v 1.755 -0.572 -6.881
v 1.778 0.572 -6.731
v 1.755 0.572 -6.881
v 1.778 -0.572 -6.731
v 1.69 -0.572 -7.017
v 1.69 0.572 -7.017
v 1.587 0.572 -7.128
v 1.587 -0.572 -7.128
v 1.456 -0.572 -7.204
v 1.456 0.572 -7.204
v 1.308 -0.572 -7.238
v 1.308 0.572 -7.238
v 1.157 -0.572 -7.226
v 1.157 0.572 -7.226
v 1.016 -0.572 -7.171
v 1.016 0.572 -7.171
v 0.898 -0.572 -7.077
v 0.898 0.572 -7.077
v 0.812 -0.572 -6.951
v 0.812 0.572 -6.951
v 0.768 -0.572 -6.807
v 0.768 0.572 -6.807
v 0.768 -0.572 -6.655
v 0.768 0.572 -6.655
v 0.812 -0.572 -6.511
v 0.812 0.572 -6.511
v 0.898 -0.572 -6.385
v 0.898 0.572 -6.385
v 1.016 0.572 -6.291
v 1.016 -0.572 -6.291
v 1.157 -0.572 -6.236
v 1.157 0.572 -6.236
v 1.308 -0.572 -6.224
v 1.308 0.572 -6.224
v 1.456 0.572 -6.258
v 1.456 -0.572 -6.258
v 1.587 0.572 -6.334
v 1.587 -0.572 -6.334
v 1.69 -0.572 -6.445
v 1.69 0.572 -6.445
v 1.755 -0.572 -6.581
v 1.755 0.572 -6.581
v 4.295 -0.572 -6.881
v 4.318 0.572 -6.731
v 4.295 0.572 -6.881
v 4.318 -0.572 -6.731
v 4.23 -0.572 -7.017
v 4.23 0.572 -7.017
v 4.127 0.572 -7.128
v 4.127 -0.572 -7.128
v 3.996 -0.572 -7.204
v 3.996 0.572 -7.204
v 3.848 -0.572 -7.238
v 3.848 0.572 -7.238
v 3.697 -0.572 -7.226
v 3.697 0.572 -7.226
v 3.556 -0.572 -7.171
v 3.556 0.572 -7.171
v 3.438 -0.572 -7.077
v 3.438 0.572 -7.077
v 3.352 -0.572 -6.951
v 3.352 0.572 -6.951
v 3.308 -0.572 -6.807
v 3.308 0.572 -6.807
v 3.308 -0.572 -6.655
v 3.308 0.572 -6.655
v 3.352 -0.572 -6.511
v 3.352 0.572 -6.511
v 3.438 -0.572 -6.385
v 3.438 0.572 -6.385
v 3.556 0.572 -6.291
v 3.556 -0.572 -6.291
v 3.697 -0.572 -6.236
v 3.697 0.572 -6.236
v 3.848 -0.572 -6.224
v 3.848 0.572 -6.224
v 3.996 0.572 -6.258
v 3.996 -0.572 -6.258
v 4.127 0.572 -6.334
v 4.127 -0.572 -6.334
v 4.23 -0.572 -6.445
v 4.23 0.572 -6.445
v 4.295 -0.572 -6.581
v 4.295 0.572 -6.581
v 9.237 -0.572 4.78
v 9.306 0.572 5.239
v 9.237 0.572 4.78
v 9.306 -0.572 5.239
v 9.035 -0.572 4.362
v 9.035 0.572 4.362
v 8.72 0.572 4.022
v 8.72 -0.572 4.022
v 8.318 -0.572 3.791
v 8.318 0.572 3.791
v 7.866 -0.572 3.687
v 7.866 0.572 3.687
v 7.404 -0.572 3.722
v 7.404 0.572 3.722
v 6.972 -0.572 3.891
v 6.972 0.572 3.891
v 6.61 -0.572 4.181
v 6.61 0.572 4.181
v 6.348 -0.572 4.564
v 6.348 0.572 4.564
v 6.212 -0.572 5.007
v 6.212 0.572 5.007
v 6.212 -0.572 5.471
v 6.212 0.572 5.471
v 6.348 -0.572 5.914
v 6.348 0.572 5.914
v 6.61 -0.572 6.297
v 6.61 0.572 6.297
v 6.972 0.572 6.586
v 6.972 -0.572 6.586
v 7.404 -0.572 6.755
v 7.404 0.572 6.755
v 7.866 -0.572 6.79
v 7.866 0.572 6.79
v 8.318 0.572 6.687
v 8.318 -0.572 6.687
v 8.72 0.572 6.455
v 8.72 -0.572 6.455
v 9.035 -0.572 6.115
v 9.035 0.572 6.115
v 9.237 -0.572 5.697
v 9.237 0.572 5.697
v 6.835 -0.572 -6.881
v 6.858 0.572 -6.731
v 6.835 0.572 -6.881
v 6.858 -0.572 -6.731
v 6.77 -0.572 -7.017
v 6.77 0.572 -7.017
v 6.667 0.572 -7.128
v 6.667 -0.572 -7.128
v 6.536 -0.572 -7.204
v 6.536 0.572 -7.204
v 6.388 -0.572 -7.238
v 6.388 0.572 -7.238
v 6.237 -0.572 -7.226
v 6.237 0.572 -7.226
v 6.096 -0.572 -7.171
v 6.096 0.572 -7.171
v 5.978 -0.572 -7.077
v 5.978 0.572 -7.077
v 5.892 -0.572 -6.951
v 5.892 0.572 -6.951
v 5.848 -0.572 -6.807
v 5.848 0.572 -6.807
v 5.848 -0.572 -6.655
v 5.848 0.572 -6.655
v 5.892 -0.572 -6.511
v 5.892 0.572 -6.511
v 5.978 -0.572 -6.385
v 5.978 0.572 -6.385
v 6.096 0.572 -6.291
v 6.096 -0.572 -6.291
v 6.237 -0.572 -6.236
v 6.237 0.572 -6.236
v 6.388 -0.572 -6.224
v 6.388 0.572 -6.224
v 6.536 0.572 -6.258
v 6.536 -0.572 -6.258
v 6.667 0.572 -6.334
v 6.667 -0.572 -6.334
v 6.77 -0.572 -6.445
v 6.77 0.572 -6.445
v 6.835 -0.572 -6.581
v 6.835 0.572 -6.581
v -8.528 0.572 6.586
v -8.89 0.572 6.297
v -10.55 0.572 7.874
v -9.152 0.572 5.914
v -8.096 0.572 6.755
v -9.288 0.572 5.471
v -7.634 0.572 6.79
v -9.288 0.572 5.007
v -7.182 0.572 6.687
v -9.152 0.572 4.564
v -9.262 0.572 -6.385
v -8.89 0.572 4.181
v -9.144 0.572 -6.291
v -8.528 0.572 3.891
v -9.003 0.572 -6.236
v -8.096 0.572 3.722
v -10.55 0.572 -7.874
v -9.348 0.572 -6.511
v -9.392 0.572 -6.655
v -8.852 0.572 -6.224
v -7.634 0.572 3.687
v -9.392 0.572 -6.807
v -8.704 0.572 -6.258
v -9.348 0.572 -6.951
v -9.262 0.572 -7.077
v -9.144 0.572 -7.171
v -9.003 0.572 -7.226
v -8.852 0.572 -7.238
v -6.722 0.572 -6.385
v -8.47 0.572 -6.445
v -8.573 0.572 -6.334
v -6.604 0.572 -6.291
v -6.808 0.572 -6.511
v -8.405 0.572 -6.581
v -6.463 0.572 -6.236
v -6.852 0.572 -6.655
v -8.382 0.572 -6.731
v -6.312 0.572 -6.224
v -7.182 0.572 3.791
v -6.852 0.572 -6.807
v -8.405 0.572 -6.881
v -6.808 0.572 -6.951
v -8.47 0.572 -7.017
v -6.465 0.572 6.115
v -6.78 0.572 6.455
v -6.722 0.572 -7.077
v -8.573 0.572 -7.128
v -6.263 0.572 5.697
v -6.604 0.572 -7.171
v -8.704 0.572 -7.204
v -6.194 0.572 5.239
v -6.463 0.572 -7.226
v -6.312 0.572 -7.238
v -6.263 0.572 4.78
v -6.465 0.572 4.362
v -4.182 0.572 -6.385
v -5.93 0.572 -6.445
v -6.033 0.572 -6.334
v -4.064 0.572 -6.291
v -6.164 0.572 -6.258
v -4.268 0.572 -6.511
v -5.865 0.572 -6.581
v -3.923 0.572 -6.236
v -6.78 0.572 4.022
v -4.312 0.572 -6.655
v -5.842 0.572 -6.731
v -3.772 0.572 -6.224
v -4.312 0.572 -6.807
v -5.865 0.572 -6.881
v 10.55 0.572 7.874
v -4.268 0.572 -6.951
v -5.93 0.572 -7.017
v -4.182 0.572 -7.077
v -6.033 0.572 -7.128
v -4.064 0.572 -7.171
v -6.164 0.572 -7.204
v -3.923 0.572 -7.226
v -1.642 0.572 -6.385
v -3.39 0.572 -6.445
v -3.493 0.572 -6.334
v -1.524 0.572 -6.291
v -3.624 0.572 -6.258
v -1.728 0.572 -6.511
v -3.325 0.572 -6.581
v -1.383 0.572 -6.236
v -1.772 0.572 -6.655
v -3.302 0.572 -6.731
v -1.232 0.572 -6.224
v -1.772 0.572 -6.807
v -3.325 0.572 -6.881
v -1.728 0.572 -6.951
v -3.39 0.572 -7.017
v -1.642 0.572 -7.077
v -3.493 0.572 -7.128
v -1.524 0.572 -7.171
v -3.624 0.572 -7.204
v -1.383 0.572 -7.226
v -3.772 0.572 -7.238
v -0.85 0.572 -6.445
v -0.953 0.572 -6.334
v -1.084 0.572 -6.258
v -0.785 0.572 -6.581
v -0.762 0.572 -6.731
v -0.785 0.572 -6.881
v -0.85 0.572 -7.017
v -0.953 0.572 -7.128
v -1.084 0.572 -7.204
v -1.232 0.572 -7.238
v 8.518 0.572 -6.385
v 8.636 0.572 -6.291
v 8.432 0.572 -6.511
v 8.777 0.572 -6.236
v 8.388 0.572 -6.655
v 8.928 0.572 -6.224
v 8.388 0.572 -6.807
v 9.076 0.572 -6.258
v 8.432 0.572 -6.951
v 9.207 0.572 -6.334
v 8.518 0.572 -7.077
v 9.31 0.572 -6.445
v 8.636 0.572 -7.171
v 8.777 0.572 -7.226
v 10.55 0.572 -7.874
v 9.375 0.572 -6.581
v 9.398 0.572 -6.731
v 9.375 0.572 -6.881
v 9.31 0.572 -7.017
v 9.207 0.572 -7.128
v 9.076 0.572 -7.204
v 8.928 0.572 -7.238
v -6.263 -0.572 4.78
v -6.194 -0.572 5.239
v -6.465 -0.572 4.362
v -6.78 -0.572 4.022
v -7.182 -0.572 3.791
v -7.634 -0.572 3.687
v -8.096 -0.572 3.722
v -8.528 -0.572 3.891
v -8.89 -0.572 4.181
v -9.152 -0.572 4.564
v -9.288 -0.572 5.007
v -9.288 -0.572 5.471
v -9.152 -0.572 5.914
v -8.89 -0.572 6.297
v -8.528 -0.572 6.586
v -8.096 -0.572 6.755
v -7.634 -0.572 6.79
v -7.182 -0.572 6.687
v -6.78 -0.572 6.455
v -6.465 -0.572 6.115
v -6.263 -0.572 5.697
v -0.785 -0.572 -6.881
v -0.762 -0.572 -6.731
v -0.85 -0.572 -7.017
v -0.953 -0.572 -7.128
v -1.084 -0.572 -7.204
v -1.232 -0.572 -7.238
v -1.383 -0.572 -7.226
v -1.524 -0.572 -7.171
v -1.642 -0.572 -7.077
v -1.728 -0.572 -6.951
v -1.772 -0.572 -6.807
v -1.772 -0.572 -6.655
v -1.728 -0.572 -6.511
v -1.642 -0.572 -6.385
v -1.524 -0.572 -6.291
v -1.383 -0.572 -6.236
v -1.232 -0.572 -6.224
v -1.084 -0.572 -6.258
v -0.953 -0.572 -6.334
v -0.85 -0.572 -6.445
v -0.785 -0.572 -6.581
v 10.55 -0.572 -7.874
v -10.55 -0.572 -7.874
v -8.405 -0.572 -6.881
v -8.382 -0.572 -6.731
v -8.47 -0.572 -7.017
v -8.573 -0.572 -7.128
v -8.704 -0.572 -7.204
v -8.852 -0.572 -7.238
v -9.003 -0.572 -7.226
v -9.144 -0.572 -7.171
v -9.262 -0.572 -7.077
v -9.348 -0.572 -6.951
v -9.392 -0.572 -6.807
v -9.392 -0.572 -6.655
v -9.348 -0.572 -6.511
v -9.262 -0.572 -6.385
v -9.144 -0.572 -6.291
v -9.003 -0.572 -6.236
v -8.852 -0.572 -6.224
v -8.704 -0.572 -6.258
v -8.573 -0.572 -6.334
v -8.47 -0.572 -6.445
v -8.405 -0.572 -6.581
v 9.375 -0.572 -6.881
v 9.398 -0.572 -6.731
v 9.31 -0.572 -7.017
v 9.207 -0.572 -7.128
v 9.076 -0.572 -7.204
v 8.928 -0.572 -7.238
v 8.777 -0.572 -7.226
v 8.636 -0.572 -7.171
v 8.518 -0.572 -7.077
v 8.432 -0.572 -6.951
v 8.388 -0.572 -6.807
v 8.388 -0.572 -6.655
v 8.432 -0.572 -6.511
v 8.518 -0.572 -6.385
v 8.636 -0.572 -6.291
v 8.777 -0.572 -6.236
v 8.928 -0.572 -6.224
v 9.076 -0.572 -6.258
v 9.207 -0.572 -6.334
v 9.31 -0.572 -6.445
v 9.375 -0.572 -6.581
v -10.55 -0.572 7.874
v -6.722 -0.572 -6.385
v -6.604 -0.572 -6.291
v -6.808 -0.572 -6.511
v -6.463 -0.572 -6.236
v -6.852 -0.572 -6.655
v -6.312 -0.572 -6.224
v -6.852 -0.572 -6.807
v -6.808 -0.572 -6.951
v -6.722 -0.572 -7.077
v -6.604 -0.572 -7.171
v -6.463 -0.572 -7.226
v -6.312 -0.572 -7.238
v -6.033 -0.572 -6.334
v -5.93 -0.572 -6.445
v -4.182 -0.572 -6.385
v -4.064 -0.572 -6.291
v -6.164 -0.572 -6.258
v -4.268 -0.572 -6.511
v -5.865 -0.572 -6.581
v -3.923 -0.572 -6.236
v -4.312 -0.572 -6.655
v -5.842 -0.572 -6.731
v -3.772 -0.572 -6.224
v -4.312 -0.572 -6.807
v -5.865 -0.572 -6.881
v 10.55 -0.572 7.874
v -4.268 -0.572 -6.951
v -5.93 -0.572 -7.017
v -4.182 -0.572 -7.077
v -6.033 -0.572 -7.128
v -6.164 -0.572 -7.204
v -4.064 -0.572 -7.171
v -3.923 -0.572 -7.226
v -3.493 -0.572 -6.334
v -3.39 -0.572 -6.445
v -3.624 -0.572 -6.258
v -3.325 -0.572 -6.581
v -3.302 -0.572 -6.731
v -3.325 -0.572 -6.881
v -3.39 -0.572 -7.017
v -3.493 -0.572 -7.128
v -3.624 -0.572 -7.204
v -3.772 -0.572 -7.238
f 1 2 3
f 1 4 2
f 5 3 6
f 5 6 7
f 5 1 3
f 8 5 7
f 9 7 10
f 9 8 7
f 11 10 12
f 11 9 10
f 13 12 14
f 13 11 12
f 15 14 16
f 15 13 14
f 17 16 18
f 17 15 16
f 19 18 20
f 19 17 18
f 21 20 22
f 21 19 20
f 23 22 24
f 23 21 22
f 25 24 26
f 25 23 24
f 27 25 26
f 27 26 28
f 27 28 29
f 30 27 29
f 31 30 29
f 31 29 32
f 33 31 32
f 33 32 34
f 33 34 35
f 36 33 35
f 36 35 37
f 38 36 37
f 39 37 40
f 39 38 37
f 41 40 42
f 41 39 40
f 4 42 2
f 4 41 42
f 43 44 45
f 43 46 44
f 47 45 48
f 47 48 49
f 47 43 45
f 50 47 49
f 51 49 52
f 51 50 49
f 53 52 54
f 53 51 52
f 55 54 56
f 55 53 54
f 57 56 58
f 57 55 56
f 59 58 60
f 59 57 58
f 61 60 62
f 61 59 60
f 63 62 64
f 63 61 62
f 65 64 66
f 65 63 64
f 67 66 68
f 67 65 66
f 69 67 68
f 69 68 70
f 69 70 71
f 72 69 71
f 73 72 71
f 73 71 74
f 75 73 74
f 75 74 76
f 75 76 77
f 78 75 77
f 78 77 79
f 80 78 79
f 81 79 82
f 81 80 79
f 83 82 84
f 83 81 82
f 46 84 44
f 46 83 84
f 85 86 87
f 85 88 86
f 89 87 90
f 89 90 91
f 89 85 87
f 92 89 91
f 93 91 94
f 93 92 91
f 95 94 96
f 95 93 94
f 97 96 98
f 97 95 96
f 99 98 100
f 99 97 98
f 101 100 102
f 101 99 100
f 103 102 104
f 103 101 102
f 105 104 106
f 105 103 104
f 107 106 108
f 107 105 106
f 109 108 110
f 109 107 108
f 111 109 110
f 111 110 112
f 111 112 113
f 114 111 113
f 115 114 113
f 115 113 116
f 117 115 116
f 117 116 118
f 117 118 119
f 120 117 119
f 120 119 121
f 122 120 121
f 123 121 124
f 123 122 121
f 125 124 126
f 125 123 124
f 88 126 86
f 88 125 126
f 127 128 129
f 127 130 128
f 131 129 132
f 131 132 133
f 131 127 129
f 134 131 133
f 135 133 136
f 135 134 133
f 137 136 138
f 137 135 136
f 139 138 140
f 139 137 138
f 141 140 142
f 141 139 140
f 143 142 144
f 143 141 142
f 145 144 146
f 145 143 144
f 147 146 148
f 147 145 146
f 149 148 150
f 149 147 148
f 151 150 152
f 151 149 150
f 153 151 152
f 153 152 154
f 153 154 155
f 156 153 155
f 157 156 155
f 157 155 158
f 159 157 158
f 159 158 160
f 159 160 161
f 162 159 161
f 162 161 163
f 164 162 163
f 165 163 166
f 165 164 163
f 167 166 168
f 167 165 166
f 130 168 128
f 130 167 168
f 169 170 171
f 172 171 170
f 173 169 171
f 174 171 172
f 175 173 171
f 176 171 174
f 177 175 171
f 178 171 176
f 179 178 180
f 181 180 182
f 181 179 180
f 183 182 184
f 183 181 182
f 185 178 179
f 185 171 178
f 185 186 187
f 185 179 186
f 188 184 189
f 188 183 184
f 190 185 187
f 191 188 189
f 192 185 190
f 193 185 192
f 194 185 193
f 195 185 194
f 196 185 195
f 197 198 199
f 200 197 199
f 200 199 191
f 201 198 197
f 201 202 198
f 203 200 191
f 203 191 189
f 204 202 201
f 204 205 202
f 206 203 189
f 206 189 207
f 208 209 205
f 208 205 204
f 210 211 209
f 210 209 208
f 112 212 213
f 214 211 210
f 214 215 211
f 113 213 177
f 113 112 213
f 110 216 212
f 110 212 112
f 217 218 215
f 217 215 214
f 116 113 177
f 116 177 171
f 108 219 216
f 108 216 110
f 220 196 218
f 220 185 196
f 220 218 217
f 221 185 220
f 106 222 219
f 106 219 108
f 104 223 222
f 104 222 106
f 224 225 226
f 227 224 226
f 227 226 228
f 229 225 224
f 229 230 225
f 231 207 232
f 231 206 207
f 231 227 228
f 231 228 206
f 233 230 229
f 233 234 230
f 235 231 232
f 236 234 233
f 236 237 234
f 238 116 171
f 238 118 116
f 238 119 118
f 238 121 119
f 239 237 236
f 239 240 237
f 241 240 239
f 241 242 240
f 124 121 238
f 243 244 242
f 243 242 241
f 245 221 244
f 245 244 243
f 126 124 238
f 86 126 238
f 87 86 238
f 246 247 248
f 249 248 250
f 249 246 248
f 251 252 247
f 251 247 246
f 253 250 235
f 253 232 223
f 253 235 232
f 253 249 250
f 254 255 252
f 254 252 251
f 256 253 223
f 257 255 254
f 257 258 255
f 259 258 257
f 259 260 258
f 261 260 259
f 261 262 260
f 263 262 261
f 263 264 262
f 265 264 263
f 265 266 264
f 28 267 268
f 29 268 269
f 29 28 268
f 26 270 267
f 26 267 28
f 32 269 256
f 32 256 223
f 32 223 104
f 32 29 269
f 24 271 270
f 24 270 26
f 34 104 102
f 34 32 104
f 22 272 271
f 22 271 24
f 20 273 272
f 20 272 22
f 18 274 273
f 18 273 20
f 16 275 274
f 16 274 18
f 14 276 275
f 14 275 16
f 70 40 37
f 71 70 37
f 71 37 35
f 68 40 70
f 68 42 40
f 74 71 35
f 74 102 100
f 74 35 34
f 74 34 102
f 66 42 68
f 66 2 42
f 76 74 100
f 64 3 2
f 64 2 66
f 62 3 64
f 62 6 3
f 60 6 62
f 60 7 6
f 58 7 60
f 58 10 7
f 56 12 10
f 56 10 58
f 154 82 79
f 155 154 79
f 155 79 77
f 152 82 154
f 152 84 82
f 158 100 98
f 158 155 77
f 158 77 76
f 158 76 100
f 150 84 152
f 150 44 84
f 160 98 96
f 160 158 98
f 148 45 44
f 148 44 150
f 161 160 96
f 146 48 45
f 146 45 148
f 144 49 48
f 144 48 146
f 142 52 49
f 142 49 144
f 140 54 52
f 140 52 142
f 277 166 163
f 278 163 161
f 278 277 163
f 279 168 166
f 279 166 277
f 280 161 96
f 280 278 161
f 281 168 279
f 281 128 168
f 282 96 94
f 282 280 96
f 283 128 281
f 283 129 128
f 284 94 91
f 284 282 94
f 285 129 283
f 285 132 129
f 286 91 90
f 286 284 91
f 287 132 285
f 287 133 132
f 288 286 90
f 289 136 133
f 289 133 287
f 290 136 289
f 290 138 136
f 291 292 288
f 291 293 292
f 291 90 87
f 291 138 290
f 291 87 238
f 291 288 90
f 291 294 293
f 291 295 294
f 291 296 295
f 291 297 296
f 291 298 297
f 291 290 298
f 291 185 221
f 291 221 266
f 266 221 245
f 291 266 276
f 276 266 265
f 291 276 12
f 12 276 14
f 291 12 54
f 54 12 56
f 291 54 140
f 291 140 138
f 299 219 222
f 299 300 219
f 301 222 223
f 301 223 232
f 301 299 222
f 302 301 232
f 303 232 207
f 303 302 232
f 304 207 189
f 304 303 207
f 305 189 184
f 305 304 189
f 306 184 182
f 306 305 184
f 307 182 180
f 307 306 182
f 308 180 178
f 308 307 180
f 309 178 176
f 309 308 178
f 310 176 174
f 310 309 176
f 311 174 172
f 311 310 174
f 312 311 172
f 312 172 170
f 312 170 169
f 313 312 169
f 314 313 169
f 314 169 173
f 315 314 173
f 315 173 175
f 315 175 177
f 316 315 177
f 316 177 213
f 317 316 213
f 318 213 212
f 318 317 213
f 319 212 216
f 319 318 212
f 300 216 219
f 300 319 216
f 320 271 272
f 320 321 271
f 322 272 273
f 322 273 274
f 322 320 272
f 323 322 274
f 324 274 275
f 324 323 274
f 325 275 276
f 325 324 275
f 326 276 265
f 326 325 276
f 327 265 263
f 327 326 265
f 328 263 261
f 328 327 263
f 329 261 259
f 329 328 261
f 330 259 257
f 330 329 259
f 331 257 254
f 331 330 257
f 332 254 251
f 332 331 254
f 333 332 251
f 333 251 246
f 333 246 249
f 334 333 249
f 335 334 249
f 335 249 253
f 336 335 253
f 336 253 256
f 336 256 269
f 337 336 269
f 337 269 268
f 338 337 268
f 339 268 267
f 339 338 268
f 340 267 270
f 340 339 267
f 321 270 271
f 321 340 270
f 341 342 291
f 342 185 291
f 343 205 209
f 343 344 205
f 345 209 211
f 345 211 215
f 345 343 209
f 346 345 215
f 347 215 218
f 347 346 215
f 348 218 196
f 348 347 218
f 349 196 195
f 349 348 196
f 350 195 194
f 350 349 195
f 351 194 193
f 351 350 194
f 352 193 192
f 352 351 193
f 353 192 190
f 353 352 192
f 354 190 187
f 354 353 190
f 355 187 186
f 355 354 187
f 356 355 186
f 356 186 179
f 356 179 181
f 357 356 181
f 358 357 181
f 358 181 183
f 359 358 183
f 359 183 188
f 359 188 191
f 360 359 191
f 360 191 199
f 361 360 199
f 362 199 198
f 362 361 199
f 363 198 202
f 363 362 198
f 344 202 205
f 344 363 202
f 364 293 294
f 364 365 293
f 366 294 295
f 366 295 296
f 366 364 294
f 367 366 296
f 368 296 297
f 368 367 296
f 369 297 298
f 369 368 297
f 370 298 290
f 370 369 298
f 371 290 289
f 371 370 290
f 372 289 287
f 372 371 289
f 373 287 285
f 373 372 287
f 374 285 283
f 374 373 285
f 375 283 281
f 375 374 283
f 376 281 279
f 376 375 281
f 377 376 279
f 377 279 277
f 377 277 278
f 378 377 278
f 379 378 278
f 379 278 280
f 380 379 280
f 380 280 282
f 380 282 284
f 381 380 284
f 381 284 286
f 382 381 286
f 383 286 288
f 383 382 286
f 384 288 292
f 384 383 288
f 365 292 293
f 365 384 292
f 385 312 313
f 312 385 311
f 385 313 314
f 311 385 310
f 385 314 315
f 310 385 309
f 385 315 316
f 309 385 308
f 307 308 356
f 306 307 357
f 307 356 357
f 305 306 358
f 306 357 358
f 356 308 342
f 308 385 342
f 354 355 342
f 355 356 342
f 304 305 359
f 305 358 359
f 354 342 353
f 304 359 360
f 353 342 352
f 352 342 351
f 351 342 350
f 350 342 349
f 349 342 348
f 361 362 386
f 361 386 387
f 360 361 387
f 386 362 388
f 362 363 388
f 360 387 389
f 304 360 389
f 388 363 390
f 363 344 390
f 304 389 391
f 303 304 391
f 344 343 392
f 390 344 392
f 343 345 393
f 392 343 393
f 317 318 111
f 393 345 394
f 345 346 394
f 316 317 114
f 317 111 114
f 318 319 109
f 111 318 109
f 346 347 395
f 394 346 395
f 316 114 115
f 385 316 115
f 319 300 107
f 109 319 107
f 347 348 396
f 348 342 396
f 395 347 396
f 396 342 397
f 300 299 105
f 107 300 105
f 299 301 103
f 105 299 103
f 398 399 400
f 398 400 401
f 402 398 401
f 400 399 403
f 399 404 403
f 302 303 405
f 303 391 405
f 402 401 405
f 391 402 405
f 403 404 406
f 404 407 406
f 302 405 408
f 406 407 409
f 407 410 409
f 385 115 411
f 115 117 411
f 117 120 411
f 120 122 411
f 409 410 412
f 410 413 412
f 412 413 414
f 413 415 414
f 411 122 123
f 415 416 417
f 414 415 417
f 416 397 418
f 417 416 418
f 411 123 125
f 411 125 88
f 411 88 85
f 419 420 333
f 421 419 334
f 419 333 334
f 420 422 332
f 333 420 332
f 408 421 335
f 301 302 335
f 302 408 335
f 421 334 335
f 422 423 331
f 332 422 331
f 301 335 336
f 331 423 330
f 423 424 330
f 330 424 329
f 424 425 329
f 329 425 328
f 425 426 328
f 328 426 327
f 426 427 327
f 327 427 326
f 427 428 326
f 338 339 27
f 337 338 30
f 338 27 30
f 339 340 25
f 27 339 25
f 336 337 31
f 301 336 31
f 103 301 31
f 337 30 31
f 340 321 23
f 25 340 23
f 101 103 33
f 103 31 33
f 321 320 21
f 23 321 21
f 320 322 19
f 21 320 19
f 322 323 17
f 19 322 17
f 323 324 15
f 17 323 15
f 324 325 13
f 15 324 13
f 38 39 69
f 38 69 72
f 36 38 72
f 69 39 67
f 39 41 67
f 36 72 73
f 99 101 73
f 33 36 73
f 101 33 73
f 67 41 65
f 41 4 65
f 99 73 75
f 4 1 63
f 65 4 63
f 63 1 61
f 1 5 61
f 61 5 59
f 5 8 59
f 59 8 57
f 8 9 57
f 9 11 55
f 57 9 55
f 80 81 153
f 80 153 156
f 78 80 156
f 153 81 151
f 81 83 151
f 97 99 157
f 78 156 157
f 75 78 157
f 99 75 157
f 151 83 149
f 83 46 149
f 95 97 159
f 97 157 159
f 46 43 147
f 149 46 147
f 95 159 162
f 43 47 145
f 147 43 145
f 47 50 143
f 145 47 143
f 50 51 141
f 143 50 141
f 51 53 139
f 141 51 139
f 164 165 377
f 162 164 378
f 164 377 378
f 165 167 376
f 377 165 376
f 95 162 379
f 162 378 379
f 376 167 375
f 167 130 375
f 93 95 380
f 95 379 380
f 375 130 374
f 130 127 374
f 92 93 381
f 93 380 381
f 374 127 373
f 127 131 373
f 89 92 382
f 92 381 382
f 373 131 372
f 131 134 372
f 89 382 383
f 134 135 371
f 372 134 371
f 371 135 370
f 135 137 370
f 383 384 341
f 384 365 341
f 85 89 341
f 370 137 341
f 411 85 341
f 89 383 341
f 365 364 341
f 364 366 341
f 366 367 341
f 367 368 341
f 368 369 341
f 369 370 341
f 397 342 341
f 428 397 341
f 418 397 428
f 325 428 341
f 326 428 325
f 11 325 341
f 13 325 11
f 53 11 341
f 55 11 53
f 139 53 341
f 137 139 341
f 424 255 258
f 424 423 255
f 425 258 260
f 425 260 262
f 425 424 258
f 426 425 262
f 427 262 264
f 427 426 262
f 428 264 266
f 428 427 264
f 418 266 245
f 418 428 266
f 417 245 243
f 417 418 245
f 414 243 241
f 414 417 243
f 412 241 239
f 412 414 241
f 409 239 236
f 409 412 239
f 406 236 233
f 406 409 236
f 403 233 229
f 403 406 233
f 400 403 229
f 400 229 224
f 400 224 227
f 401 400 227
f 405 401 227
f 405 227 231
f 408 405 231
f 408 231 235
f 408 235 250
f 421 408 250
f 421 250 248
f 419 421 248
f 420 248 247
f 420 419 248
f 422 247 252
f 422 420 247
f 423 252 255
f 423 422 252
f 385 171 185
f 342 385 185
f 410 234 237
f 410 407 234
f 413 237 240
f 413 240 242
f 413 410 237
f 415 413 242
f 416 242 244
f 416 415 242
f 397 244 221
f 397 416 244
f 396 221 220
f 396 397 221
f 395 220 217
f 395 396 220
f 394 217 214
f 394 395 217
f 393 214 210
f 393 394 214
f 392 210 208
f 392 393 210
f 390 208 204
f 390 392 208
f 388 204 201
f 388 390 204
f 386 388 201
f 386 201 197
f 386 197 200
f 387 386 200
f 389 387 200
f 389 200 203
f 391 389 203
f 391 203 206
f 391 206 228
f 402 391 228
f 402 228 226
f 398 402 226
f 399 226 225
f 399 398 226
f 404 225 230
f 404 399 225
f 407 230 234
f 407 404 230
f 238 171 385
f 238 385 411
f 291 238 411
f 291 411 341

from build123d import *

# Parameters (mm, degrees)
SKETCH1_W           = 21.1
SKETCH1_H           = 15.748
SKETCH1_R           = 1.55575
SKETCH1_R_2         = 0.508
BOSS_EXTRUDE1_DEPTH = 0.5715


with BuildPart() as part:
    # Sketch1 → Boss-Extrude1 (new body, symmetric)
    with BuildSketch(Plane(origin=(0, 0, 0), x_dir=(1, 0, 0), z_dir=(0, 1, 0))):
        Rectangle(SKETCH1_W, SKETCH1_H)
        with Locations((-7.75, -5.23875)):
            Circle(SKETCH1_R, mode=Mode.SUBTRACT)
        with Locations((7.75, -5.23875)):
            Circle(SKETCH1_R, mode=Mode.SUBTRACT)
        with Locations((-8.89, 6.731)):
            Circle(SKETCH1_R_2, mode=Mode.SUBTRACT)
        with Locations((-6.35, 6.731)):
            Circle(SKETCH1_R_2, mode=Mode.SUBTRACT)
        with Locations((-3.81, 6.731)):
            Circle(SKETCH1_R_2, mode=Mode.SUBTRACT)
        with Locations((-1.27, 6.731)):
            Circle(SKETCH1_R_2, mode=Mode.SUBTRACT)
        with Locations((1.27, 6.731)):
            Circle(SKETCH1_R_2, mode=Mode.SUBTRACT)
        with Locations((3.81, 6.731)):
            Circle(SKETCH1_R_2, mode=Mode.SUBTRACT)
        with Locations((6.35, 6.731)):
            Circle(SKETCH1_R_2, mode=Mode.SUBTRACT)
        with Locations((8.89, 6.731)):
            Circle(SKETCH1_R_2, mode=Mode.SUBTRACT)
    extrude(amount=BOSS_EXTRUDE1_DEPTH, both=True)


solid = part.part
